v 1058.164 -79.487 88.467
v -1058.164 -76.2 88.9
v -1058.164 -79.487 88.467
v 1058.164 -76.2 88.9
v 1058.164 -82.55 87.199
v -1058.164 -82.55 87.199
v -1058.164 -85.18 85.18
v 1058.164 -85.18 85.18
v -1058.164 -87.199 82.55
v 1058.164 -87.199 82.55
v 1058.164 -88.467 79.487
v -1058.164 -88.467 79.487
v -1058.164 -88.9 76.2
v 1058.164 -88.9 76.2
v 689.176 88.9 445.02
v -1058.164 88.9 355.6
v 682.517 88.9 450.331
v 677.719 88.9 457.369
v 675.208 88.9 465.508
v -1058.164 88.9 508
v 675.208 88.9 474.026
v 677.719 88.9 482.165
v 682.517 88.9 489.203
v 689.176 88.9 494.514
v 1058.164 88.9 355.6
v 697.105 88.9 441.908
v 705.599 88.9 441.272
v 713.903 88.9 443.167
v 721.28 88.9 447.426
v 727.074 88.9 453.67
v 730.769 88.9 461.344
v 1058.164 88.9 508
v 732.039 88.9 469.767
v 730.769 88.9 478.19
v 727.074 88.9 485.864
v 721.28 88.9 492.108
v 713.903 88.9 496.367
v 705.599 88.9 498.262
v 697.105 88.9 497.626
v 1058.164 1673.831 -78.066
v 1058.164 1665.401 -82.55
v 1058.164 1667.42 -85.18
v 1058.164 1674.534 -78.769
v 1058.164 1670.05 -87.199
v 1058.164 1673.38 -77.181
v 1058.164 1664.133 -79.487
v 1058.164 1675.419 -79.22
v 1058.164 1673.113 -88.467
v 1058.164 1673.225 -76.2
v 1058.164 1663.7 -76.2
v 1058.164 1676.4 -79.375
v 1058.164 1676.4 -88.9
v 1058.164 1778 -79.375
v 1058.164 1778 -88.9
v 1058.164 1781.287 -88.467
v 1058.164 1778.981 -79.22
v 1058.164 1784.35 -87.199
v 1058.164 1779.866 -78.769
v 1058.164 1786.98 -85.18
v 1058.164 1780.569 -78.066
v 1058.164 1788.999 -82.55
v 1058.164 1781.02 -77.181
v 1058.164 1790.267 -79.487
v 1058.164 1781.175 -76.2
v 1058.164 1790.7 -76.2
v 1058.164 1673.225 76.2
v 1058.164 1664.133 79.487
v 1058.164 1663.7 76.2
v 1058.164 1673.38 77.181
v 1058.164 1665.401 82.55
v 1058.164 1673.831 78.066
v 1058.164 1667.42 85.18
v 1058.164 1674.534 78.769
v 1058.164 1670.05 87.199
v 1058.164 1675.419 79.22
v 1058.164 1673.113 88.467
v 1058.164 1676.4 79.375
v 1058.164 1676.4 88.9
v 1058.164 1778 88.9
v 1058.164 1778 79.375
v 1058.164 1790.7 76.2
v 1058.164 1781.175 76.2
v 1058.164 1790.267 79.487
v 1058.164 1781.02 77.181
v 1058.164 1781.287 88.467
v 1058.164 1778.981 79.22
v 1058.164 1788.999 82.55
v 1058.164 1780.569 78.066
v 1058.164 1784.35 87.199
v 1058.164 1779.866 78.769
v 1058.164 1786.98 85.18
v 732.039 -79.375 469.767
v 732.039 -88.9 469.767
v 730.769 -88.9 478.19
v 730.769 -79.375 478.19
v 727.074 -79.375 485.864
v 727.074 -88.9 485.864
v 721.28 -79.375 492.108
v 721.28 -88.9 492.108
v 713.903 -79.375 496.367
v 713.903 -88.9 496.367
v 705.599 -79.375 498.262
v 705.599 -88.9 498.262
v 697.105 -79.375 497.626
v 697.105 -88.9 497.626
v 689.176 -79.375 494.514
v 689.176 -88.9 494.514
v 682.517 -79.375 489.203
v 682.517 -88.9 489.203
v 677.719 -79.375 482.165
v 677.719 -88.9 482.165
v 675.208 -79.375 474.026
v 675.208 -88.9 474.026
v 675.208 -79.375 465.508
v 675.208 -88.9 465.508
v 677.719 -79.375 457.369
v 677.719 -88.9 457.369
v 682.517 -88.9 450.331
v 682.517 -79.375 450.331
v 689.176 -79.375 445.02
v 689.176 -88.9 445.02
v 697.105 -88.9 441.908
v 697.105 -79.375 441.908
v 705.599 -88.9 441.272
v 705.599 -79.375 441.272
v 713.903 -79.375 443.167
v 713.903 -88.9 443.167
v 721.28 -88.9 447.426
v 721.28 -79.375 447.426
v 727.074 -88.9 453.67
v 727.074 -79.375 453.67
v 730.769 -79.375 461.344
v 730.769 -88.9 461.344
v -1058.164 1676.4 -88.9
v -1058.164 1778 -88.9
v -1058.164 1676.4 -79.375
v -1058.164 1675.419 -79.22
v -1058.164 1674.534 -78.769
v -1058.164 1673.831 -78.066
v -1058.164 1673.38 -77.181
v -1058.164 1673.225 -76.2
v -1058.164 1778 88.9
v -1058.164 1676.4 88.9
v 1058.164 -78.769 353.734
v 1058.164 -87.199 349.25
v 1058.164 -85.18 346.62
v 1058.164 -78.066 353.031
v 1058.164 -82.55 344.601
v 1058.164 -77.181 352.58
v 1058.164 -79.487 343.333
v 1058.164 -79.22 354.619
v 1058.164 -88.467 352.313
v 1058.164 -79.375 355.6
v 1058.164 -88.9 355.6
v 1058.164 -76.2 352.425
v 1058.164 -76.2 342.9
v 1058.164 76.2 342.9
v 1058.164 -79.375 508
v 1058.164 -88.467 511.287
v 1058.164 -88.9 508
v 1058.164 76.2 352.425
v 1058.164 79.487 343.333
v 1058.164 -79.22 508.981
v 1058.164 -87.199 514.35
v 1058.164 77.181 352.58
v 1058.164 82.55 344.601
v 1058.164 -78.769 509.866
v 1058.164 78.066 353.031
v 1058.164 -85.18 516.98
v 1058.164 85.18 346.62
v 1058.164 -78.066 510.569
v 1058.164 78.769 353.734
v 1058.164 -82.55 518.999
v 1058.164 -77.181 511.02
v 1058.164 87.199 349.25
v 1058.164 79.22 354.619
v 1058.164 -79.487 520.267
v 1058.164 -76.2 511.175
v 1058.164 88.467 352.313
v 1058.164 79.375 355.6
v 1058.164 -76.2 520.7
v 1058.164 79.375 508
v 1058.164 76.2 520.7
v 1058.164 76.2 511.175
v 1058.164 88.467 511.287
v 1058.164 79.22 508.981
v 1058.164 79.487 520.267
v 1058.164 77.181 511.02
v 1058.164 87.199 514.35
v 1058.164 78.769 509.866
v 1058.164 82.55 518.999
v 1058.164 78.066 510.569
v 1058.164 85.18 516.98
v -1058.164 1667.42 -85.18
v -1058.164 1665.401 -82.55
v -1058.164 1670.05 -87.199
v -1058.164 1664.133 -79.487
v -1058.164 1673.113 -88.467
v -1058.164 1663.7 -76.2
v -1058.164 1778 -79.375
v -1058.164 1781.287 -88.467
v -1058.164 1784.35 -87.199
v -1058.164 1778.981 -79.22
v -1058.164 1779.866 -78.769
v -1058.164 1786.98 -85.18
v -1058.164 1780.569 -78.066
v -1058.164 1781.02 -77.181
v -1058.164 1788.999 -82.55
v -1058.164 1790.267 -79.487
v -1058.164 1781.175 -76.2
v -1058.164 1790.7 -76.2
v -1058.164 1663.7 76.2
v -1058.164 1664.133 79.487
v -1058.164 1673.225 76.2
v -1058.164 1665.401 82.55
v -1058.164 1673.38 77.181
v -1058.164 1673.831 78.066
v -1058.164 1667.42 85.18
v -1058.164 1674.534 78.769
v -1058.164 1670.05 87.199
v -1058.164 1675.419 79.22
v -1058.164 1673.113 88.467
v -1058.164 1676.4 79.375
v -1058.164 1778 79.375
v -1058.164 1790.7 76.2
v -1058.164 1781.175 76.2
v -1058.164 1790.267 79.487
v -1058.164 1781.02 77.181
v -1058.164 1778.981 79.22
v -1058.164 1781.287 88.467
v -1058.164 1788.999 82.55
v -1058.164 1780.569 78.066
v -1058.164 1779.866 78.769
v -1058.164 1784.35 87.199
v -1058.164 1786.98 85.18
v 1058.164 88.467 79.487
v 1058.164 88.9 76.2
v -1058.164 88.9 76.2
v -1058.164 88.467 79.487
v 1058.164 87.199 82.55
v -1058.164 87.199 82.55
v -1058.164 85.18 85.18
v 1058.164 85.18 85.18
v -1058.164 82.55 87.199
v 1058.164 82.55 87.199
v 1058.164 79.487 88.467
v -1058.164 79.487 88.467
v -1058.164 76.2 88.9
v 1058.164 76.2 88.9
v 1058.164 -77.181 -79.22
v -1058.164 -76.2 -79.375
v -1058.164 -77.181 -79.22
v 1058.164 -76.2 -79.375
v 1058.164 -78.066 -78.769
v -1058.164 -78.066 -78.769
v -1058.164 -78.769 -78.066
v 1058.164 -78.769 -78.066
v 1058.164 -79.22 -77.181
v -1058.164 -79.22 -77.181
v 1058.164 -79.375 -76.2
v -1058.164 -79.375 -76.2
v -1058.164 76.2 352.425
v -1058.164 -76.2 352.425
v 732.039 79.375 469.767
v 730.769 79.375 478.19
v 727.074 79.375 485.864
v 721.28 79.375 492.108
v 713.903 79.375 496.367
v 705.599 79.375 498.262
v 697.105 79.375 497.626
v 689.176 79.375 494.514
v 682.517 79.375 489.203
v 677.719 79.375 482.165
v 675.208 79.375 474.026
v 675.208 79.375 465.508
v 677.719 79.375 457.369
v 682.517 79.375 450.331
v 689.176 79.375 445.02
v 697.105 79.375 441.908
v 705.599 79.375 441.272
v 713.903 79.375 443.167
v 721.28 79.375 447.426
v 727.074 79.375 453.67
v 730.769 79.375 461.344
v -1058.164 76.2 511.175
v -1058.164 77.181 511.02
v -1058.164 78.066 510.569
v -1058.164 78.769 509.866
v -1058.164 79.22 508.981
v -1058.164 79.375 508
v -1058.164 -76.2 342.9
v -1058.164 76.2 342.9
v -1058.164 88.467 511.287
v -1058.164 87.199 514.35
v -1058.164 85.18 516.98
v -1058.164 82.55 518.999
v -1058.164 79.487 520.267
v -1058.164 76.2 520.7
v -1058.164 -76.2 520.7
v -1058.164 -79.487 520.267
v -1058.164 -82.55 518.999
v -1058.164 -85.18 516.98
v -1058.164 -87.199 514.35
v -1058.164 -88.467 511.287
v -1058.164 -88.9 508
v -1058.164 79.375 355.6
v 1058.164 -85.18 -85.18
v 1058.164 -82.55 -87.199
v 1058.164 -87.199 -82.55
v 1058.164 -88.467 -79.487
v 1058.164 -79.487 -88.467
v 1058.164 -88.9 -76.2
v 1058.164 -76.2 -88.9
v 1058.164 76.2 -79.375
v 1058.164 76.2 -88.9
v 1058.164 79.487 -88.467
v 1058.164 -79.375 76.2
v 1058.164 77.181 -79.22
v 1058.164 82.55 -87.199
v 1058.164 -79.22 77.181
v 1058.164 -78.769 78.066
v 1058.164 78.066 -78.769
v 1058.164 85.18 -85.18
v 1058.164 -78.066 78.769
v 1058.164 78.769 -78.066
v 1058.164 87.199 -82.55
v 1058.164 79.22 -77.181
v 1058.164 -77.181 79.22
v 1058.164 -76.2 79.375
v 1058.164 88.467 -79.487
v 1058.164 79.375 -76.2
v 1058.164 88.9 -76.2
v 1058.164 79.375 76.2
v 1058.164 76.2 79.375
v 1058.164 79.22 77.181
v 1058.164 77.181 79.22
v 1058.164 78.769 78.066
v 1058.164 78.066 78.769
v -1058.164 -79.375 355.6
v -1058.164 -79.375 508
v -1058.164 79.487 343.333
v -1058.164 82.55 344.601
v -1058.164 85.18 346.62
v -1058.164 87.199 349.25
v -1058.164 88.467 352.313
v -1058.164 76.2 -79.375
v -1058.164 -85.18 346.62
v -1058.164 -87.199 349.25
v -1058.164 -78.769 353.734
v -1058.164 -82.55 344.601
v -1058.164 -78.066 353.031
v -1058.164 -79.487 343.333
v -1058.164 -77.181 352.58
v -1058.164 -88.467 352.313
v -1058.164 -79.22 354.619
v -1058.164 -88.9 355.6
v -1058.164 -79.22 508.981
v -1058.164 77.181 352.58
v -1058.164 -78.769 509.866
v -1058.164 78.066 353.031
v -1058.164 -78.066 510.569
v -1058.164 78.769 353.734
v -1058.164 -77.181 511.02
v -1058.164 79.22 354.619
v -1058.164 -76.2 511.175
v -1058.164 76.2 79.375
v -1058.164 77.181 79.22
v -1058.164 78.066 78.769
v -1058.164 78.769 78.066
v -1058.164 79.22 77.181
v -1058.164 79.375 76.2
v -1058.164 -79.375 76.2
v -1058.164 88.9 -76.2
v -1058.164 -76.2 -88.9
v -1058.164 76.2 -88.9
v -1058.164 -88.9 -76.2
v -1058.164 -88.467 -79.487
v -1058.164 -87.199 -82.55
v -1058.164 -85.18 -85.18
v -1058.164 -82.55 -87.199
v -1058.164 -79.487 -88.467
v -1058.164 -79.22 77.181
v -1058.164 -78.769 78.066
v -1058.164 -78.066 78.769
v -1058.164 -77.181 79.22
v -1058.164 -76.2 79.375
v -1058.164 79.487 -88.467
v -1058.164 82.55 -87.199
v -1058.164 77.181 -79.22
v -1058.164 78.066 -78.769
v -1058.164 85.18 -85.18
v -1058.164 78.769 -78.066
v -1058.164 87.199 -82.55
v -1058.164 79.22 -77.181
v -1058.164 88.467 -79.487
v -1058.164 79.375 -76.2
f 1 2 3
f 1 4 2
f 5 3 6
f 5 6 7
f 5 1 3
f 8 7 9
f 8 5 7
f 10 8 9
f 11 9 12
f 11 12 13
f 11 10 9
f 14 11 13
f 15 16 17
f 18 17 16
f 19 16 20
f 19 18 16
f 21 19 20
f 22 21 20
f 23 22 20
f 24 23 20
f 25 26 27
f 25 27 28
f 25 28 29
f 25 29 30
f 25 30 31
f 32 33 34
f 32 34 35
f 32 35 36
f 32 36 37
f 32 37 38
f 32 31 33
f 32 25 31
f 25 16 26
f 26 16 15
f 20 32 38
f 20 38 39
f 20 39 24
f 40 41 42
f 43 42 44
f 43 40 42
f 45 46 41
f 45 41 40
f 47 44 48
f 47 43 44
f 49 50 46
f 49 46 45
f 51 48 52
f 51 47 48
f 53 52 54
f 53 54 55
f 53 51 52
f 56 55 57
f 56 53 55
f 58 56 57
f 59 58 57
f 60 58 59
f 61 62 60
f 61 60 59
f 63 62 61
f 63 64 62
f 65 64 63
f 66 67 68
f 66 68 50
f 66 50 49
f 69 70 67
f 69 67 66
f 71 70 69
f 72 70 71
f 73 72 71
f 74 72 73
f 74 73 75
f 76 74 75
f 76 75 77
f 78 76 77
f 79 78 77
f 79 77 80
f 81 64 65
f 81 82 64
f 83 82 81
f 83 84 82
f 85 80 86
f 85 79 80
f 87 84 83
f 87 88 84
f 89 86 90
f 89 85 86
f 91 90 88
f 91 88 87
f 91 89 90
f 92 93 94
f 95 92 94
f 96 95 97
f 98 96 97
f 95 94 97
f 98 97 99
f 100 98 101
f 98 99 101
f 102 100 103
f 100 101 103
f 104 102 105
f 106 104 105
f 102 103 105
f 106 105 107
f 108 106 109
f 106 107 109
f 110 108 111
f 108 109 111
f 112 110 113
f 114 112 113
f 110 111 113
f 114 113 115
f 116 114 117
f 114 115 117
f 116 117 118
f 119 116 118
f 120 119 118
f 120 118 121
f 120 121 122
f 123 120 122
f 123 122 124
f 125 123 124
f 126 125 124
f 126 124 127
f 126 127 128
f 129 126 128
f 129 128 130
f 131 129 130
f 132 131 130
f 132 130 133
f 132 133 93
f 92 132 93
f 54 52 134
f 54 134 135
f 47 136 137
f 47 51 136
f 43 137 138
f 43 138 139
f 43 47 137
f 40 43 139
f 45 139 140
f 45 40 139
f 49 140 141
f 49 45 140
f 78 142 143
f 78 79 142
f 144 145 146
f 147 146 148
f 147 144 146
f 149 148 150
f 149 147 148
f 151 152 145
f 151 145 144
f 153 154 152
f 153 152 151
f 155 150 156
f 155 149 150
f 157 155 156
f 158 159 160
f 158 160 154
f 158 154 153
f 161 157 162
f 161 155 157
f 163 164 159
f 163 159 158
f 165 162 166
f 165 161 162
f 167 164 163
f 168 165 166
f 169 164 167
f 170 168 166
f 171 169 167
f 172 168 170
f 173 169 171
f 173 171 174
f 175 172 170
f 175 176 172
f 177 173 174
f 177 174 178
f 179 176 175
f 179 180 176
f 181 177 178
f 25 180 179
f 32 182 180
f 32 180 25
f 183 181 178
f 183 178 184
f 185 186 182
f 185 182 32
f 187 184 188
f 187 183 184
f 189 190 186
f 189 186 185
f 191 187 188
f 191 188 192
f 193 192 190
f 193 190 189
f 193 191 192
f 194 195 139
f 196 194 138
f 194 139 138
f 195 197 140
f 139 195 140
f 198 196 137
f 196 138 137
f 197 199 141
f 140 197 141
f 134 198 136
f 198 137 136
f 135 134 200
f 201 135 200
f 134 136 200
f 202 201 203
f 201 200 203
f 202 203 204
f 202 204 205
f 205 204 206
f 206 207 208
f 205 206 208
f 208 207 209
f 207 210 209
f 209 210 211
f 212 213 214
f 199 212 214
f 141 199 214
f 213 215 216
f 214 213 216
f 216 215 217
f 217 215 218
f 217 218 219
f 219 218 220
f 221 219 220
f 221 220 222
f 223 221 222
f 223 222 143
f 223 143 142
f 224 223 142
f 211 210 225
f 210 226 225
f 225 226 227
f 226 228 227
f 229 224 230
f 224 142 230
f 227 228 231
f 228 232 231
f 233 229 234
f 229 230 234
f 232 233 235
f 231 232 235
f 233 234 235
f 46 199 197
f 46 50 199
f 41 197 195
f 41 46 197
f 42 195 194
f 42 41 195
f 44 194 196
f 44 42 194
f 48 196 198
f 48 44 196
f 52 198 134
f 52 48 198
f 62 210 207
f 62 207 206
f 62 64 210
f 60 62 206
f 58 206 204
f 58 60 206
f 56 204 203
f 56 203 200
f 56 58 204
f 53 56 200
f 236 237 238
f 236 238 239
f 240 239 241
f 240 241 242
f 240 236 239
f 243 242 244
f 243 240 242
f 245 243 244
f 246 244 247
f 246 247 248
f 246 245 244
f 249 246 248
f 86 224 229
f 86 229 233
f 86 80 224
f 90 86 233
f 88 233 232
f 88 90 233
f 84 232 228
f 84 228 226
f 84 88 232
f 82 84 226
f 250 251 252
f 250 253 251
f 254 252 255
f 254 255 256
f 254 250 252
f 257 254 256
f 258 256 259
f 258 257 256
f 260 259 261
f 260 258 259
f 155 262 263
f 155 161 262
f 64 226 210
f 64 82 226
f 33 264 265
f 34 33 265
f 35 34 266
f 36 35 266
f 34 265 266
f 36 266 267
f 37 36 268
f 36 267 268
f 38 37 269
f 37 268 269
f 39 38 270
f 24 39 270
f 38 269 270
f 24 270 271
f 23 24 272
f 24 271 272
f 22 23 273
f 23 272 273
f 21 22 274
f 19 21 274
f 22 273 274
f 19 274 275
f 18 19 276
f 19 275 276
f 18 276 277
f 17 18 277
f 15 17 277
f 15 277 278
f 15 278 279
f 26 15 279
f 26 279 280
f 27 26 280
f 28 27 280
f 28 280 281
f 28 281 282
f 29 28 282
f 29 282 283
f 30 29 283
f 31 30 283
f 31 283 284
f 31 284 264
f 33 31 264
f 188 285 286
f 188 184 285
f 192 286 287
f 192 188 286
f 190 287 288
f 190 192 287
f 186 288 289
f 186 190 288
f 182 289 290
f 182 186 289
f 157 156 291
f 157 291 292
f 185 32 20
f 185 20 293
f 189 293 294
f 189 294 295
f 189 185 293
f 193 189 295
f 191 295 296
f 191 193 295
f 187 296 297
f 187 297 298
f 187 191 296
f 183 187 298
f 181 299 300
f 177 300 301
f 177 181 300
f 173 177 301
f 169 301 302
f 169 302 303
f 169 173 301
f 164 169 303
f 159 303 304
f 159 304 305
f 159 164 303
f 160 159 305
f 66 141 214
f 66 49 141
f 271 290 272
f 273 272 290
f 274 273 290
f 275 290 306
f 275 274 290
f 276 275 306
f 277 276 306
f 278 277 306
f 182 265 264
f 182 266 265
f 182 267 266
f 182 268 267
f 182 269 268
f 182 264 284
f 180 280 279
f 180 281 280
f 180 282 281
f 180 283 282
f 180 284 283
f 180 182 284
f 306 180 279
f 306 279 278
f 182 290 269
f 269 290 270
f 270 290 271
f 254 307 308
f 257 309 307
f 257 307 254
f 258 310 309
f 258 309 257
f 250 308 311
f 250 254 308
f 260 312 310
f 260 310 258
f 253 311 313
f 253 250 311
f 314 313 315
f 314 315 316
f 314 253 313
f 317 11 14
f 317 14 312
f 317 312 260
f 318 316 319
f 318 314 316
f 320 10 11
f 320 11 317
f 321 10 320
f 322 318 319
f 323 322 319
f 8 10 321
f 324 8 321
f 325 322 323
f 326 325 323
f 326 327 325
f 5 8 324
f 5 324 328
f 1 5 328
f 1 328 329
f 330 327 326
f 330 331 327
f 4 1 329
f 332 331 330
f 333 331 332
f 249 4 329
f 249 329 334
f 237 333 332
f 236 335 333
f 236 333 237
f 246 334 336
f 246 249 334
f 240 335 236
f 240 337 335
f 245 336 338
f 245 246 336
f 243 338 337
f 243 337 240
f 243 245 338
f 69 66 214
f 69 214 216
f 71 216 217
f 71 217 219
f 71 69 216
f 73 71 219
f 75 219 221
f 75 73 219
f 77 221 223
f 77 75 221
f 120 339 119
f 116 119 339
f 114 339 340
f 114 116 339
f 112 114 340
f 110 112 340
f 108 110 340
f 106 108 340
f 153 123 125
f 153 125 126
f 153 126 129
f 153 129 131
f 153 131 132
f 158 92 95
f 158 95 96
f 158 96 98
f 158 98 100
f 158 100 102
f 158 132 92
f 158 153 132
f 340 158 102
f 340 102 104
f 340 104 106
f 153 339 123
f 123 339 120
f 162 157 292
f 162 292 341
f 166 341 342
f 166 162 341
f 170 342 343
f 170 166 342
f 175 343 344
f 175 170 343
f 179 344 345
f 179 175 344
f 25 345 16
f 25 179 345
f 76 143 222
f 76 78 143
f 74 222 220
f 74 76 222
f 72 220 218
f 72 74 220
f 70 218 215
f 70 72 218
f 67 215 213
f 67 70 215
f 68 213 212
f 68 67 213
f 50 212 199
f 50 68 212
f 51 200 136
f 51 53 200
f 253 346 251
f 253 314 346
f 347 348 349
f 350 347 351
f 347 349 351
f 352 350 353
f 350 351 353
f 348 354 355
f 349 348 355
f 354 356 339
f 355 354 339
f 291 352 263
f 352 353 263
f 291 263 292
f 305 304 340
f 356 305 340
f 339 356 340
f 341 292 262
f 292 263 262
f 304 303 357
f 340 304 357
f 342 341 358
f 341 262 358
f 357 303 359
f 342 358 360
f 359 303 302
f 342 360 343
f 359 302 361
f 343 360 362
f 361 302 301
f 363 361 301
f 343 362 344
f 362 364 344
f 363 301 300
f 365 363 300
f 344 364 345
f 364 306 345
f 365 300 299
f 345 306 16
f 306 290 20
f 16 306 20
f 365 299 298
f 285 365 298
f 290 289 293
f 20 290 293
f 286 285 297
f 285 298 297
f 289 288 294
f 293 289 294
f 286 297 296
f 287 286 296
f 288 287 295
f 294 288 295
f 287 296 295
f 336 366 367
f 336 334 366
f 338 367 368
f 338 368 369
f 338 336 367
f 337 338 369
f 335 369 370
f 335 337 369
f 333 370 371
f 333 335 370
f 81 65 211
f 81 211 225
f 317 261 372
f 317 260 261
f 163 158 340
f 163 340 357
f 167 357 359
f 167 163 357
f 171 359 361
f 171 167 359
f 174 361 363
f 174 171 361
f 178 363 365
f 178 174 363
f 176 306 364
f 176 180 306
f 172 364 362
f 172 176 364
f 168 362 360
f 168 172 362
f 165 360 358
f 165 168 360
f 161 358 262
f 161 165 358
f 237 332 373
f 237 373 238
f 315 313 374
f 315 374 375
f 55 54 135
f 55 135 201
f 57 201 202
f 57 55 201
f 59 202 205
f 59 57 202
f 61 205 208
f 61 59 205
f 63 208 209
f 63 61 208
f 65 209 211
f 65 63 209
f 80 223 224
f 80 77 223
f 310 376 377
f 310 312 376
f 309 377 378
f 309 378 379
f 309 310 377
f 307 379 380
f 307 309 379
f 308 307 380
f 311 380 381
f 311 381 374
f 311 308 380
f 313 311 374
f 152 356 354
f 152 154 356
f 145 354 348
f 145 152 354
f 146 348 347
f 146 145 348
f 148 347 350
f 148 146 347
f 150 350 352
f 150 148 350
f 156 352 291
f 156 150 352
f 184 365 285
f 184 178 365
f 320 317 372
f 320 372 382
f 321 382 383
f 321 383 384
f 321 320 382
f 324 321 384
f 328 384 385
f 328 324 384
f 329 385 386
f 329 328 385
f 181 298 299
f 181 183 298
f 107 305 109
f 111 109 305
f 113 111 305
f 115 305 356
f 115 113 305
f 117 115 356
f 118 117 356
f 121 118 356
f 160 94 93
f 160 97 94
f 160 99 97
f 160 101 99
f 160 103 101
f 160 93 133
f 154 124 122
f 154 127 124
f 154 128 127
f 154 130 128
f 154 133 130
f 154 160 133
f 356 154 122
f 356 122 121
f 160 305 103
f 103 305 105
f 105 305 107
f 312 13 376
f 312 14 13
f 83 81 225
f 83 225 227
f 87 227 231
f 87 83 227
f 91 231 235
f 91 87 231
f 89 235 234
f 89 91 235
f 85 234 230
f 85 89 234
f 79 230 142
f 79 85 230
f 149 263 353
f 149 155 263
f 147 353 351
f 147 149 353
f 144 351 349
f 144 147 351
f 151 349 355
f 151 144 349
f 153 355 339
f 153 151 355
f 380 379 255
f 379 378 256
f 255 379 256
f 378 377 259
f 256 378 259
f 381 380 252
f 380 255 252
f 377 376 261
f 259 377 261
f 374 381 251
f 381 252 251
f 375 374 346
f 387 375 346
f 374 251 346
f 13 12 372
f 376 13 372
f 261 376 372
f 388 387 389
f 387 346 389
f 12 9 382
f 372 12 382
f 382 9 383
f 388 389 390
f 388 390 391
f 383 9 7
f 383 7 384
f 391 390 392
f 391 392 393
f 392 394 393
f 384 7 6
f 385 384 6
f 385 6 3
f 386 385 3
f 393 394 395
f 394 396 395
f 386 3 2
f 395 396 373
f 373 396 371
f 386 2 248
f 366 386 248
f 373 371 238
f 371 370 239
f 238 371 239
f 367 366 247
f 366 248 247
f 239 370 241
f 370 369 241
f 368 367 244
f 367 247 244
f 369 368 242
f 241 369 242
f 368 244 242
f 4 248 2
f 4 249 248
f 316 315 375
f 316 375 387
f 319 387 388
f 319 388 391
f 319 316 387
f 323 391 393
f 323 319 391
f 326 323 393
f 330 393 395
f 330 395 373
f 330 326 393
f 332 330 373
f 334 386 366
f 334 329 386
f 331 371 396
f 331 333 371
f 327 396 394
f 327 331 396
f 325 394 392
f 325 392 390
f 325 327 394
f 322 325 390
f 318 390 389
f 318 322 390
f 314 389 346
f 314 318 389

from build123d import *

# Parameters (mm, degrees)
F1_DEPTH = 1058.164
F3_DEPTH = 1058.164
F4_R     = 28.575
F5_DEPTH = 177.801
F7_DEPTH = 1058.164


with BuildPart() as f1:
    # F0 (on Right) → F1 (new body, symmetric)
    with BuildSketch(Plane.YZ):
        with BuildLine():
            ThreePointArc((-88.9, -76.2), (-85.180256, -85.180256), (-76.2, -88.9))
            Line((-76.2, -88.9), (76.2, -88.9))
            ThreePointArc((76.2, -88.9), (85.180256, -85.180256), (88.9, -76.2))
            Line((88.9, -76.2), (88.9, 76.2))
            ThreePointArc((88.9, 76.2), (85.180256, 85.180256), (76.2, 88.9))
            Line((76.2, 88.9), (-76.2, 88.9))
            ThreePointArc((-76.2, 88.9), (-85.180256, 85.180256), (-88.9, 76.2))
            Line((-88.9, 76.2), (-88.9, -76.2))
        make_face()
        with BuildLine():
            ThreePointArc((-79.375, 76.2), (-78.445064, 78.445064), (-76.2, 79.375))
            Line((-76.2, 79.375), (76.2, 79.375))
            ThreePointArc((76.2, 79.375), (78.445064, 78.445064), (79.375, 76.2))
            Line((79.375, 76.2), (79.375, -76.2))
            ThreePointArc((79.375, -76.2), (78.445064, -78.445064), (76.2, -79.375))
            Line((76.2, -79.375), (-76.2, -79.375))
            ThreePointArc((-76.2, -79.375), (-78.445064, -78.445064), (-79.375, -76.2))
            Line((-79.375, -76.2), (-79.375, 76.2))
        make_face(mode=Mode.SUBTRACT)
    extrude(amount=F1_DEPTH, both=True)


with BuildPart() as f3:
    # F2 (on Right) → F3 (new body, symmetric)
    with BuildSketch(Plane.YZ):
        with BuildLine():
            ThreePointArc((-88.9, 355.6), (-85.180256, 346.619744), (-76.2, 342.9))
            Line((-76.2, 342.9), (76.2, 342.9))
            ThreePointArc((76.2, 342.9), (85.180256, 346.619744), (88.9, 355.6))
            Line((88.9, 355.6), (88.9, 508))
            ThreePointArc((88.9, 508), (85.180256, 516.980256), (76.2, 520.7))
            Line((76.2, 520.7), (-76.2, 520.7))
            ThreePointArc((-76.2, 520.7), (-85.180256, 516.980256), (-88.9, 508))
            Line((-88.9, 508), (-88.9, 355.6))
        make_face()
        with BuildLine():
            ThreePointArc((-79.375, 508), (-78.445064, 510.245064), (-76.2, 511.175))
            Line((-76.2, 511.175), (76.2, 511.175))
            ThreePointArc((76.2, 511.175), (78.445064, 510.245064), (79.375, 508))
            Line((79.375, 508), (79.375, 355.6))
            ThreePointArc((79.375, 355.6), (78.445064, 353.354936), (76.2, 352.425))
            Line((76.2, 352.425), (-76.2, 352.425))
            ThreePointArc((-76.2, 352.425), (-78.445064, 353.354936), (-79.375, 355.6))
            Line((-79.375, 355.6), (-79.375, 508))
        make_face(mode=Mode.SUBTRACT)
    extrude(amount=F3_DEPTH, both=True)

    # F4 (on face) → F5 (cut, through all)
    with BuildSketch(Plane.XZ.offset(88.9)):
        with Locations((703.463733, 469.767064)):
            Circle(F4_R)
    extrude(amount=-F5_DEPTH, mode=Mode.SUBTRACT)


with BuildPart() as f7:
    # F6 (on Right) → F7 (new body, symmetric)
    with BuildSketch(Plane.YZ):
        with BuildLine():
            ThreePointArc((1663.7, -76.2), (1667.419744, -85.180256), (1676.4, -88.9))
            Line((1676.4, -88.9), (1778, -88.9))
            ThreePointArc((1778, -88.9), (1786.980256, -85.180256), (1790.7, -76.2))
            Line((1790.7, -76.2), (1790.7, 76.2))
            ThreePointArc((1790.7, 76.2), (1786.980256, 85.180256), (1778, 88.9))
            Line((1778, 88.9), (1676.4, 88.9))
            ThreePointArc((1676.4, 88.9), (1667.419744, 85.180256), (1663.7, 76.2))
            Line((1663.7, 76.2), (1663.7, -76.2))
        make_face()
        with BuildLine():
            ThreePointArc((1673.225, 76.2), (1674.154936, 78.445064), (1676.4, 79.375))
            Line((1676.4, 79.375), (1778, 79.375))
            ThreePointArc((1778, 79.375), (1780.245064, 78.445064), (1781.175, 76.2))
            Line((1781.175, 76.2), (1781.175, -76.2))
            ThreePointArc((1781.175, -76.2), (1780.245064, -78.445064), (1778, -79.375))
            Line((1778, -79.375), (1676.4, -79.375))
            ThreePointArc((1676.4, -79.375), (1674.154936, -78.445064), (1673.225, -76.2))
            Line((1673.225, -76.2), (1673.225, 76.2))
        make_face(mode=Mode.SUBTRACT)
    extrude(amount=F7_DEPTH, both=True)


solid = Compound([f1.part, f3.part, f7.part])
